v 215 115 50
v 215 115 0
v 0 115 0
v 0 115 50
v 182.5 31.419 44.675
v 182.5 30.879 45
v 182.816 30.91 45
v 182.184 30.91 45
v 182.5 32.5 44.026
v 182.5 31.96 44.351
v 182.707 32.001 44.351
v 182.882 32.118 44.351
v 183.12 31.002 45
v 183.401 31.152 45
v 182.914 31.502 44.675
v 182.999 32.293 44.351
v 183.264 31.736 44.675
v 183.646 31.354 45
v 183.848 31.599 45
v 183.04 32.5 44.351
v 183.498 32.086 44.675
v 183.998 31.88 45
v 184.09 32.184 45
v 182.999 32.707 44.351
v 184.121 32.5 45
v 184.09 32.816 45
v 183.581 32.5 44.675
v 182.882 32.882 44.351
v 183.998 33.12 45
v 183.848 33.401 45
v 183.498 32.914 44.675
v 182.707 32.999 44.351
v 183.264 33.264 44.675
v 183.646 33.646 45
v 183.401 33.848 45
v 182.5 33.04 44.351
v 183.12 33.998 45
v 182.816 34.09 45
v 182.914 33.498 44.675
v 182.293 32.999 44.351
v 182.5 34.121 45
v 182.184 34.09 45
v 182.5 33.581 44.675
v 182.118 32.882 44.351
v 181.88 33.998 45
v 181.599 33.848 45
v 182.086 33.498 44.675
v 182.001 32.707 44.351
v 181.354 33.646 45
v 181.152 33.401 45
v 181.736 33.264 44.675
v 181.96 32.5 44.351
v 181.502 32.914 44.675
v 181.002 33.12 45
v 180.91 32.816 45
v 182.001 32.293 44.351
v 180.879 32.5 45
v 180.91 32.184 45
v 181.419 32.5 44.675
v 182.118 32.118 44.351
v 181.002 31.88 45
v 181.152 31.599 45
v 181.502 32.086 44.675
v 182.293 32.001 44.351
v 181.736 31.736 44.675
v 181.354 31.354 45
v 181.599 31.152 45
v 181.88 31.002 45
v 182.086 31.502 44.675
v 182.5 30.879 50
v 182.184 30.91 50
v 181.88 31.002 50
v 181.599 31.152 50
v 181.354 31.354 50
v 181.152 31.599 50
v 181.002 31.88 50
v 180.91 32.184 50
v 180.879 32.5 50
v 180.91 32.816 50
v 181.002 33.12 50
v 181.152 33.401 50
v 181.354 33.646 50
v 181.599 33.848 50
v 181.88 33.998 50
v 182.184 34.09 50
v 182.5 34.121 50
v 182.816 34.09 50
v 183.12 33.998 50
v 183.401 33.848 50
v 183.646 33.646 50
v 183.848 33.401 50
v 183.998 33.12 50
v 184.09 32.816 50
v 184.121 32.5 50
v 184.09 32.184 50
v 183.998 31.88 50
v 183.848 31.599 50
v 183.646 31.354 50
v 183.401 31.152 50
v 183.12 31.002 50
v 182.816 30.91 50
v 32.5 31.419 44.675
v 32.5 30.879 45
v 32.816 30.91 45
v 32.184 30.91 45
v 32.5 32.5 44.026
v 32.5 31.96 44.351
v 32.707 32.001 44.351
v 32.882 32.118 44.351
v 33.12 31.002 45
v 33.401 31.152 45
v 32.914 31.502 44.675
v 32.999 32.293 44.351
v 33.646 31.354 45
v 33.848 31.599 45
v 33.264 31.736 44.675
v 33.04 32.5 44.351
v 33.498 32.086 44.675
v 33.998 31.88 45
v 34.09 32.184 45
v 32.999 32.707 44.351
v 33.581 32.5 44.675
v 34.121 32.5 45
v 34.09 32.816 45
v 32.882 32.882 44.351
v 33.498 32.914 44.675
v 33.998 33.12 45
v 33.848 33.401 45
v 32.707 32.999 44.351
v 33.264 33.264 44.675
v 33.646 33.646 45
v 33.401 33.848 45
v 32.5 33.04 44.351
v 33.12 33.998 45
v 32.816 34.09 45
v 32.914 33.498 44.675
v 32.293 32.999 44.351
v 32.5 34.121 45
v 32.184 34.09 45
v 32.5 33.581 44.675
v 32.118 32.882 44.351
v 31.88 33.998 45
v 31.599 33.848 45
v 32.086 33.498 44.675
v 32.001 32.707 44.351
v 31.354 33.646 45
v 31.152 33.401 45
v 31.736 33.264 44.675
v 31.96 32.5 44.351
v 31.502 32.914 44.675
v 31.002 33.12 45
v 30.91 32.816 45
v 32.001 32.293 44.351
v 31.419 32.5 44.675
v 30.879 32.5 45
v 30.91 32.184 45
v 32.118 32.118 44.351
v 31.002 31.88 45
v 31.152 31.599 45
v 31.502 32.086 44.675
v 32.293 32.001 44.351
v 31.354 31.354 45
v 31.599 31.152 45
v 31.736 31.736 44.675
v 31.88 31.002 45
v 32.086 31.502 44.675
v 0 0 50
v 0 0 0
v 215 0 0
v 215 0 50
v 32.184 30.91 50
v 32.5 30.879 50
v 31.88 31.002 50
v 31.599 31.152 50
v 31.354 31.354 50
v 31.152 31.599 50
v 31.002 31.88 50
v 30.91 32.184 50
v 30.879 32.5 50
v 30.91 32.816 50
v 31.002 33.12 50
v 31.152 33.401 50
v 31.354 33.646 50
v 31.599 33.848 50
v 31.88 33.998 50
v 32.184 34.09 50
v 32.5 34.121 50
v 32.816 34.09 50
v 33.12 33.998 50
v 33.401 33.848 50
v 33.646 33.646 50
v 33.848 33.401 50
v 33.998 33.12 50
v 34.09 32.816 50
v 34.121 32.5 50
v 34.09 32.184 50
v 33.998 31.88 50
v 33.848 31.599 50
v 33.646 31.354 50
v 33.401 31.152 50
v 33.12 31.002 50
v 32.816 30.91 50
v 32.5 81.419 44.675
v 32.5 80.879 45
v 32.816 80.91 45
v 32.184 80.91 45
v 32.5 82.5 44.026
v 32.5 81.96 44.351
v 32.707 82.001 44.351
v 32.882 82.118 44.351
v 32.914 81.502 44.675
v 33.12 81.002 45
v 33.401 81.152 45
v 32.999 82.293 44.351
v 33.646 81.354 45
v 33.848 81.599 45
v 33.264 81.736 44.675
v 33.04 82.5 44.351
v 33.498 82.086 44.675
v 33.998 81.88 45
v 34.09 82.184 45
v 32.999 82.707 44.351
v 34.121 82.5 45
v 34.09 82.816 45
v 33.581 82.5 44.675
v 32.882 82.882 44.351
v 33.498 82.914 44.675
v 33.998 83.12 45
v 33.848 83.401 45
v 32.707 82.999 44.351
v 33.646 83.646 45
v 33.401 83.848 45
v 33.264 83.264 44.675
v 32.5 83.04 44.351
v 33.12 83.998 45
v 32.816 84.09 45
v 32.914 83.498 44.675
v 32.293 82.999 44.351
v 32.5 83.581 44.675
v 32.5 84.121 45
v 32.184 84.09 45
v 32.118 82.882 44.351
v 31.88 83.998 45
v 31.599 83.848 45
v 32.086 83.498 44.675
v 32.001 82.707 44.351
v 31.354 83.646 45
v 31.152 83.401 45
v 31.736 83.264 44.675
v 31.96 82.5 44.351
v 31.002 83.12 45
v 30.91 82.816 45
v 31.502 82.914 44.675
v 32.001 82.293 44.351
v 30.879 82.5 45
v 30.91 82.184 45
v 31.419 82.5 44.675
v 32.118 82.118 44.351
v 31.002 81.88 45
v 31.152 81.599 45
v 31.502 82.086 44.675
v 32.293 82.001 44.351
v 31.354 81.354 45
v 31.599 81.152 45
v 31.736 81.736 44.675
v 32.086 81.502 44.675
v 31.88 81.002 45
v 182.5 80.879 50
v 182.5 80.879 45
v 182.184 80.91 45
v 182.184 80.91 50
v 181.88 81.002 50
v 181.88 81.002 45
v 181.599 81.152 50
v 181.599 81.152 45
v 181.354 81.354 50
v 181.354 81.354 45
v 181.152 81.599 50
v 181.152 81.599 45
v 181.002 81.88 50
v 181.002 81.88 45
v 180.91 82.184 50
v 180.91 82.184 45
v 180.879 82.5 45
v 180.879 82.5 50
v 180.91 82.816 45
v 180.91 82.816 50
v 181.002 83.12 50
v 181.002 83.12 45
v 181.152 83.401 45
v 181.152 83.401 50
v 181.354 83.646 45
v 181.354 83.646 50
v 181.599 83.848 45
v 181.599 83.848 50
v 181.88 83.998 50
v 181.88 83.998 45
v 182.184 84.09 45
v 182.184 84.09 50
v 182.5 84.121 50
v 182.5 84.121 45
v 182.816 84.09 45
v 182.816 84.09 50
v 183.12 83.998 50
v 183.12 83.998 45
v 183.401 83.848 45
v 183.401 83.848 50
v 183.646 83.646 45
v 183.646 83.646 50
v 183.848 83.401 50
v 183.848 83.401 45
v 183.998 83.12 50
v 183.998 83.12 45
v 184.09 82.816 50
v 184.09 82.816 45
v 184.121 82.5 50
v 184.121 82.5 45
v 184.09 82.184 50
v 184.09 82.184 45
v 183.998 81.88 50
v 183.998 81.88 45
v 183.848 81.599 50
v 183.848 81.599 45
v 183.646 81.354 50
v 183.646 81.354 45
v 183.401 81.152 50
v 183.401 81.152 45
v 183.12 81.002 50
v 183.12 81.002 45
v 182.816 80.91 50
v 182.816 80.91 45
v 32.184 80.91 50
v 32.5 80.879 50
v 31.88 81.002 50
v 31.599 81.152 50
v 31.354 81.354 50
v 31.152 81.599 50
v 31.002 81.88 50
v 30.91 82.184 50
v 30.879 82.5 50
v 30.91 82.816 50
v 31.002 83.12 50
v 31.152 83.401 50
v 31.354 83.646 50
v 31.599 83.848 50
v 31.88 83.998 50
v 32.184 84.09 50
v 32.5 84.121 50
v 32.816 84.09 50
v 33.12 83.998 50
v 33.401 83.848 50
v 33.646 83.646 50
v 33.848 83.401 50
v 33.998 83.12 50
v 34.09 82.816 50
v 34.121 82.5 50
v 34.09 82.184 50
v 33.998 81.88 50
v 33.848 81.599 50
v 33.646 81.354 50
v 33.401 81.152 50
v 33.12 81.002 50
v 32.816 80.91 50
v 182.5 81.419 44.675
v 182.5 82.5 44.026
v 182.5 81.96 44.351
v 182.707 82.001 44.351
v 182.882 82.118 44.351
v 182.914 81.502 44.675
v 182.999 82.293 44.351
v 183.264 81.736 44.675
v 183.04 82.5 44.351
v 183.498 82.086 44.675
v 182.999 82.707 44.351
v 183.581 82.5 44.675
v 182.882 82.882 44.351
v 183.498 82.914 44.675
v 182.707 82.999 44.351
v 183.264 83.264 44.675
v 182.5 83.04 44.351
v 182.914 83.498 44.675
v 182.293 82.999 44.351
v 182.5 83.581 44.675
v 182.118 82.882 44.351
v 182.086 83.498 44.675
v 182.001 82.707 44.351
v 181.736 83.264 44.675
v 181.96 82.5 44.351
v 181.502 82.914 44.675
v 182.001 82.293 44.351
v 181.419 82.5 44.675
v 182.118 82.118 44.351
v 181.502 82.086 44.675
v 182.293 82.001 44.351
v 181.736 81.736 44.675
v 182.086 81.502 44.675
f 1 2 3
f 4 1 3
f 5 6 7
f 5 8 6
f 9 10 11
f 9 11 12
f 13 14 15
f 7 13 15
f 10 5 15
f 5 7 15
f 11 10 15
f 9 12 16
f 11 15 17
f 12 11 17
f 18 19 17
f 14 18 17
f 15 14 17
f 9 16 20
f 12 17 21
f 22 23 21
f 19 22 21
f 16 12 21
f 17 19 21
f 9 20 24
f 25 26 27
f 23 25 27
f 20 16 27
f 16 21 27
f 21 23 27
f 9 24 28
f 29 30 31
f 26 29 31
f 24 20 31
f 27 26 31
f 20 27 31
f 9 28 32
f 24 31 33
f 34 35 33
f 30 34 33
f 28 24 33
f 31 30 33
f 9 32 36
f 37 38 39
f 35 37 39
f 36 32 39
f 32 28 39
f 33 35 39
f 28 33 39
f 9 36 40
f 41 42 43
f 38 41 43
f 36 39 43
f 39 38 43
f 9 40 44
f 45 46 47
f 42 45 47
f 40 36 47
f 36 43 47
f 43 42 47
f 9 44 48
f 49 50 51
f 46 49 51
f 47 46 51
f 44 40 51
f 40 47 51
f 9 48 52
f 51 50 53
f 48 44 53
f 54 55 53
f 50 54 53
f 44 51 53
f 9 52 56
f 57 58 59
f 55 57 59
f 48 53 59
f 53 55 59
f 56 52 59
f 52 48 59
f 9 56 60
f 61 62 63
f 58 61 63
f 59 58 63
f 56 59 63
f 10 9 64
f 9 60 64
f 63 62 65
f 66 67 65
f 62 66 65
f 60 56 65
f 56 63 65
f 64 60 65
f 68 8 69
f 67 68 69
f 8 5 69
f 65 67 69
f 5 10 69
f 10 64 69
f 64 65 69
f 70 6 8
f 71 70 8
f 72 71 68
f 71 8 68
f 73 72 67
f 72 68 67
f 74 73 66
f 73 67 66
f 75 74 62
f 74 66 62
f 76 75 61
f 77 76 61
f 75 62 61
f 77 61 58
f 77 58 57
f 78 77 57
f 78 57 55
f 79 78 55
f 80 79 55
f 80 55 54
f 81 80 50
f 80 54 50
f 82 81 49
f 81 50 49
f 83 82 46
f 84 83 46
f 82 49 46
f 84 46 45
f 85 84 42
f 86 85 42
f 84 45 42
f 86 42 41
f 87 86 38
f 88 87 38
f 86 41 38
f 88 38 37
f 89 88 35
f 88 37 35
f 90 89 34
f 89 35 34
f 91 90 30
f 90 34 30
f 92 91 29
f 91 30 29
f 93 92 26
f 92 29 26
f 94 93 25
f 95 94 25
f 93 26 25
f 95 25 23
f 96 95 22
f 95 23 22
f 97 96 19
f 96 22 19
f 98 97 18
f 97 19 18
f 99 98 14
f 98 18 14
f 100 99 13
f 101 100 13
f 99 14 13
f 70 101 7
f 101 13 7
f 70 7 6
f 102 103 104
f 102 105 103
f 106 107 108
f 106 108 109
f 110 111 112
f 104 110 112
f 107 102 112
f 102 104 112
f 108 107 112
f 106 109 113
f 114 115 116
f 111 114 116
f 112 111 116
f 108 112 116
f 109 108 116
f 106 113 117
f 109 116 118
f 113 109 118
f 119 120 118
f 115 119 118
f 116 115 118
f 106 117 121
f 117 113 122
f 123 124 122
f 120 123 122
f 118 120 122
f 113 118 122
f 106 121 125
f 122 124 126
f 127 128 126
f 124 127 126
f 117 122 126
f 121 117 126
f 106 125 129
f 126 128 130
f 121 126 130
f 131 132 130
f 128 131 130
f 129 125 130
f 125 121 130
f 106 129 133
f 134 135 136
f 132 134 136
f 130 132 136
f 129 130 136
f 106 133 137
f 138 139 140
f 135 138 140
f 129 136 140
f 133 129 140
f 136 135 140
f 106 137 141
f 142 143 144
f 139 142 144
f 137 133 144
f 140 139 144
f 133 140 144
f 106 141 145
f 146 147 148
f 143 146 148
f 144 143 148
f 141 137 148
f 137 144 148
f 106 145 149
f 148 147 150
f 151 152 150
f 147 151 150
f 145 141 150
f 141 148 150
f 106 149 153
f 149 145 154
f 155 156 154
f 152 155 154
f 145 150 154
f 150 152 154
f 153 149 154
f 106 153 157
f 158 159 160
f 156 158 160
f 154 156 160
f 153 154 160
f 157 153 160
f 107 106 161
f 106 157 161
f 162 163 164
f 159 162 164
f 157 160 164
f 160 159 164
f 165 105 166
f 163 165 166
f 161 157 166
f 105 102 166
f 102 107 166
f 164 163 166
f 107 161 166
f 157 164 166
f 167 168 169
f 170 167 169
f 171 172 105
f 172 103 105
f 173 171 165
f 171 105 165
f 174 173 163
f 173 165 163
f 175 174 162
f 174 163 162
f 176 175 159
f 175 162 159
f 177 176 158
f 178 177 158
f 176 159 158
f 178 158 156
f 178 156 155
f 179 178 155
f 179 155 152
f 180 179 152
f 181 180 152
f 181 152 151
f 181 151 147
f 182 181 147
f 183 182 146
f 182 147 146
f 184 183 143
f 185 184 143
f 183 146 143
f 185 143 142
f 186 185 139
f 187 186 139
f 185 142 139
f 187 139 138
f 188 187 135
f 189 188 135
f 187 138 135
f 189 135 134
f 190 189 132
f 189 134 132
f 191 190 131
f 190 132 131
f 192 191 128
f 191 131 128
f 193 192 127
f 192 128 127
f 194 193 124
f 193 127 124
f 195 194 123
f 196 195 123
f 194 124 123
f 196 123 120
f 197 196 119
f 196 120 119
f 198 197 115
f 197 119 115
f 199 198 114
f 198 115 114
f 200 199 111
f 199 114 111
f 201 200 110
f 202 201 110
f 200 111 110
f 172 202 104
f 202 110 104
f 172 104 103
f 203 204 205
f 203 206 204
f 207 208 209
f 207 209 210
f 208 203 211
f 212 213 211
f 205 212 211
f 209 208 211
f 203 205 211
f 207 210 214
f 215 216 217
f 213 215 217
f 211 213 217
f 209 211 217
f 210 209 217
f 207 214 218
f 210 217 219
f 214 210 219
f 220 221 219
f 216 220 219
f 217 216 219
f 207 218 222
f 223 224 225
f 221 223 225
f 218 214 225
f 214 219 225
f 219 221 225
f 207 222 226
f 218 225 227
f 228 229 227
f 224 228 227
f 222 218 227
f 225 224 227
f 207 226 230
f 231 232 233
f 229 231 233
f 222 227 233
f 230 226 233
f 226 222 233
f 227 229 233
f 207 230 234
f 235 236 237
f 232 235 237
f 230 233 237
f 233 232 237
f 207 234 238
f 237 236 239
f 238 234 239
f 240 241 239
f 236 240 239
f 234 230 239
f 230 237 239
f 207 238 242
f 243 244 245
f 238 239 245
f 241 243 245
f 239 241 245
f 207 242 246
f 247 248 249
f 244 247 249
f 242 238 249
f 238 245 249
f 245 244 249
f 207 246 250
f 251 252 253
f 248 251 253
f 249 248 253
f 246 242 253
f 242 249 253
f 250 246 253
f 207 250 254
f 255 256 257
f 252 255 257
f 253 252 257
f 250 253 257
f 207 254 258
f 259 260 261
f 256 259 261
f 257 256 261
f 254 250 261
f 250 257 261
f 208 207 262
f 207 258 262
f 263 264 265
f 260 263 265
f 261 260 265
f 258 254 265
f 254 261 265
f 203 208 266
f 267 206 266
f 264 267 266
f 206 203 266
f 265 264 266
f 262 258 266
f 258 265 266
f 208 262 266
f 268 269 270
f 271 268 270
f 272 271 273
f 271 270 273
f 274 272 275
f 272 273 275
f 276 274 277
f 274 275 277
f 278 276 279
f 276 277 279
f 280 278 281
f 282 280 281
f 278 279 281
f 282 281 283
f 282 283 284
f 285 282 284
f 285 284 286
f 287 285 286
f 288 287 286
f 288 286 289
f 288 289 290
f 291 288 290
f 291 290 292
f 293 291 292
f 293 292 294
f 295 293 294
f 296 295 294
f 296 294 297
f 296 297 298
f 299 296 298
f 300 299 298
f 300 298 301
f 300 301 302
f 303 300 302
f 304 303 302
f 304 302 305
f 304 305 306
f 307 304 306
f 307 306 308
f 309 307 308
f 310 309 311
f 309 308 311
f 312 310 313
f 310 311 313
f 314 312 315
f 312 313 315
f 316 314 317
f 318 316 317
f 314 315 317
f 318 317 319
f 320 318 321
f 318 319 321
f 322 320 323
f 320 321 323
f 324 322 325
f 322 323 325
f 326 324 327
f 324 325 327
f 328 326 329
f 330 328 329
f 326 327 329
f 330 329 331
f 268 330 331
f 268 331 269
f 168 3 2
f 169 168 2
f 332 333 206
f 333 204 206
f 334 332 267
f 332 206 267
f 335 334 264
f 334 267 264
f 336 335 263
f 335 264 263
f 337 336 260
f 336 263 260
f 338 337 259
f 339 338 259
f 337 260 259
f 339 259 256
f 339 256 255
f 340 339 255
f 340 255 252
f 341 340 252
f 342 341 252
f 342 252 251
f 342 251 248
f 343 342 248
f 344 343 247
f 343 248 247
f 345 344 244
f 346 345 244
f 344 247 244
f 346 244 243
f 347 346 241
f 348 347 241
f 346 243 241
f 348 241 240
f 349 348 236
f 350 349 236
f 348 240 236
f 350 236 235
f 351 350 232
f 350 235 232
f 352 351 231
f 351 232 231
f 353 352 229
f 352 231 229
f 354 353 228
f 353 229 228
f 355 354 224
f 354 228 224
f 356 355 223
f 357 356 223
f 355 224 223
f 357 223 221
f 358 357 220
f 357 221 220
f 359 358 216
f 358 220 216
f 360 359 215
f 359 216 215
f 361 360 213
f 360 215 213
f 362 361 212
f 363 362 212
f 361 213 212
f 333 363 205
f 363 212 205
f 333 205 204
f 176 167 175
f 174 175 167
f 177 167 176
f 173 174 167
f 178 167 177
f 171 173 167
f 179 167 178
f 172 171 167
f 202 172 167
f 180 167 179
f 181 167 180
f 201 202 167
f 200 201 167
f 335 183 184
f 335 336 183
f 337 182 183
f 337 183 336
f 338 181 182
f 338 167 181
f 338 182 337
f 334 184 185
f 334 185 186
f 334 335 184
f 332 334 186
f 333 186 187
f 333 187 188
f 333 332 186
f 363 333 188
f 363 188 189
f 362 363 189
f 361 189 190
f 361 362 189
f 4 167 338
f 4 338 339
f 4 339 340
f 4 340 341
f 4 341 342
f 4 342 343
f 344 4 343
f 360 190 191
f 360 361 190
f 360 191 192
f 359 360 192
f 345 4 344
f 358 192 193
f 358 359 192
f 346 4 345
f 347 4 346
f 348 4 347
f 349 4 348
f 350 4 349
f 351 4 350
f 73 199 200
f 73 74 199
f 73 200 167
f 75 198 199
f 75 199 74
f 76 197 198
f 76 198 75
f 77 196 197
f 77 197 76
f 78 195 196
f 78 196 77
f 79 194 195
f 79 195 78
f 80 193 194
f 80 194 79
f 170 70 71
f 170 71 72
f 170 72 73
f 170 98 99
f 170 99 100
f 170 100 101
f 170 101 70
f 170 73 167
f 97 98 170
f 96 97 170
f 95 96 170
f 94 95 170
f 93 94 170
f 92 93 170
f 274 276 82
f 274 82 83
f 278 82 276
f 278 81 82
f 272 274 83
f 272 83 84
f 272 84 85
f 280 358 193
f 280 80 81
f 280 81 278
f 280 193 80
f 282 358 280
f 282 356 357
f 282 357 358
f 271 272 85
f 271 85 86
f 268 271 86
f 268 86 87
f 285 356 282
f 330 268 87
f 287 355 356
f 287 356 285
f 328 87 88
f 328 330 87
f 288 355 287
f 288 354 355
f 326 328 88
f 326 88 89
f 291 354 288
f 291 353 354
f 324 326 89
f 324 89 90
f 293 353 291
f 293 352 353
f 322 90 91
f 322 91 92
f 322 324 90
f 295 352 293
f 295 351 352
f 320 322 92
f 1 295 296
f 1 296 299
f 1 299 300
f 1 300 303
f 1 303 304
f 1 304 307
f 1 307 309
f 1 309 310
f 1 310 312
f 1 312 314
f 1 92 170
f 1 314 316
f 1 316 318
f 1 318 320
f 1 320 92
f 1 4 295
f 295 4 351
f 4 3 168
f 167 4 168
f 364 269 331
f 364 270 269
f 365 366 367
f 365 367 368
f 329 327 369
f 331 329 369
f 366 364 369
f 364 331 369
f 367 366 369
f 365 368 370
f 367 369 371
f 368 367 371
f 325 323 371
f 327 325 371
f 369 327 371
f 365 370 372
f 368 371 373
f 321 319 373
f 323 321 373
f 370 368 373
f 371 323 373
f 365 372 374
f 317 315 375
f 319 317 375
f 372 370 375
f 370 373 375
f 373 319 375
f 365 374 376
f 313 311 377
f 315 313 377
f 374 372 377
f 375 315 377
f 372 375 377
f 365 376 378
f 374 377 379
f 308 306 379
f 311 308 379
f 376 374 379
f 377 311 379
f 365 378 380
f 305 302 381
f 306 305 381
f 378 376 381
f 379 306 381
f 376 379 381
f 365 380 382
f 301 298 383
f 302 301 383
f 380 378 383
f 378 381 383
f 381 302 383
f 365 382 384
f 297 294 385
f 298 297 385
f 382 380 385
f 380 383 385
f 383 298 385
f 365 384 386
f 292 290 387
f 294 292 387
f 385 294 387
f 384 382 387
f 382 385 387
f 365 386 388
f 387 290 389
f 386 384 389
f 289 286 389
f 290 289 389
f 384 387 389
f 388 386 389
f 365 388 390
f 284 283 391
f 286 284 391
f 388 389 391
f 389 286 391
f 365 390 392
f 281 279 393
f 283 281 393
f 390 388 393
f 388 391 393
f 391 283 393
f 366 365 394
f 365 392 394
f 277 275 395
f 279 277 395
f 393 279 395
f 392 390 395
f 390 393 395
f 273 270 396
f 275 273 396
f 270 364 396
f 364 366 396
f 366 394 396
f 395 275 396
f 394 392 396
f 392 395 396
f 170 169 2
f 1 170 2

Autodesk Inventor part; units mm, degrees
ref_plane "YZ Plane" through (0, 0, 0) normal (1, 0, 0) x (0, 1, 0)
ref_plane "XZ Plane" through (0, 0, 0) normal (0, 1, 0) x (-1, 0, 0)
ref_plane "XY Plane" through (0, 0, 0) normal (0, 0, 1) x (1, 0, 0)
sketch "Sketch1" plane through (0, 0, 0) normal (0, 0, 1) x (1, 0, 0)
  line L0 (0, 0) -> (215, 0)
  line L1 (215, 0) -> (215, 115)
  line L2 (215, 115) -> (0, 115)
  line L3 (0, 115) -> (0, 0)
  dimension "d0" = 215
  dimension "d2" = 115
extrude "Extrusion1" add sketch "Sketch1" along normal blind 50
sketch "Sketch2" plane through (0, 0, 50) normal (0, 0, 1) x (1, 0, 0)
  line L0 (215, 0) -> (215, 115) projected
  line L1 (215, 115) -> (0, 115) projected
  line L2 (32.5, 82.5) -> (182.5, 82.5)
  line L3 (182.5, 82.5) -> (182.5, 32.5)
  line L4 (182.5, 32.5) -> (32.5, 32.5)
  line L5 (32.5, 32.5) -> (32.5, 82.5)
  point P0 (107.5, 82.5)
  point P1 (107.5, 115)
  point P2 (182.5, 57.5)
  point P3 (215, 57.5)
  dimension "d5" = 150
  dimension "d7" = 50
hole "Hole1" at (32.5, 82.5, 50) at (32.5, 32.5, 50) at (182.5, 32.5, 50) at (182.5, 82.5, 50) direction (0, 0, -1) diameter 3.242 depth 5 tip angle 118 thread size "M4x0.7" class "6H" standard "ANSI Metric M Profile"
properties part number "power supply"
